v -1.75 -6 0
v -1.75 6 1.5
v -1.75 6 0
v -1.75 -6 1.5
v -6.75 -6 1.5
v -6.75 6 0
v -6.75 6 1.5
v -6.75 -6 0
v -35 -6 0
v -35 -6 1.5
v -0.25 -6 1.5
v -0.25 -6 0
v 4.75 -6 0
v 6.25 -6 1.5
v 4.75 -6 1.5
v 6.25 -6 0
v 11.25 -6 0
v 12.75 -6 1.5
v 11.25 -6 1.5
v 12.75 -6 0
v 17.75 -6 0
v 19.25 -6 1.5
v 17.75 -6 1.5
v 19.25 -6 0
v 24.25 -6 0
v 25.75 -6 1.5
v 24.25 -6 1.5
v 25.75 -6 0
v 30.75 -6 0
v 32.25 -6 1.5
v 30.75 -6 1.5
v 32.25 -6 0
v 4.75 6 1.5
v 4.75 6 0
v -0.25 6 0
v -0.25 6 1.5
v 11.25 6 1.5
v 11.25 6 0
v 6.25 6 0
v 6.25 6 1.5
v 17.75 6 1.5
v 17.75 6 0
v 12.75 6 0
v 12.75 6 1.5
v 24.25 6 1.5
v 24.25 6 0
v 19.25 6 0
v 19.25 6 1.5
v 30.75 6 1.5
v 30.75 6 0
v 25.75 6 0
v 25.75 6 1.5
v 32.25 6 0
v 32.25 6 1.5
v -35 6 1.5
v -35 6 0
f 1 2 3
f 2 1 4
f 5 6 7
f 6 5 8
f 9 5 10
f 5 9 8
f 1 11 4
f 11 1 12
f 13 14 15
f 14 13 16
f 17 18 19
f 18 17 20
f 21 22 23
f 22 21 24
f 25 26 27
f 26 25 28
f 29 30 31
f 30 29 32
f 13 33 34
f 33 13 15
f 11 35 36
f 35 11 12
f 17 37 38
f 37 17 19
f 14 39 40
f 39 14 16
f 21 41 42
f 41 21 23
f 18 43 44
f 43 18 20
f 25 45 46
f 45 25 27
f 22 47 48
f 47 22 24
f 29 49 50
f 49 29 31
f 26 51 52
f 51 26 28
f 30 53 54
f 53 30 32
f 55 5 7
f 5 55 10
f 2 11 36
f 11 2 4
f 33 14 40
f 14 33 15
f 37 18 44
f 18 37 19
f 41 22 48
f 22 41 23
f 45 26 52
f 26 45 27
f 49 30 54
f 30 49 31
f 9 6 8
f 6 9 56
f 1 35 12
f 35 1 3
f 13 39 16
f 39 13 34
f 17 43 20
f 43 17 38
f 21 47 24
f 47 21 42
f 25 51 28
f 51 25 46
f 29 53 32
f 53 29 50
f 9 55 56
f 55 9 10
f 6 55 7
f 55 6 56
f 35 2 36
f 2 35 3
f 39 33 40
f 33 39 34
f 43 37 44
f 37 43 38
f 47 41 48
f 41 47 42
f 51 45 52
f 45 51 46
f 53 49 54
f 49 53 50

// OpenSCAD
// 10-well comb for casting agarose gels, printed lying flat
// Units: mm. Print orientation: flat on bed, teeth pointing -Y.

// ---------- Parameters ----------
spine_len      = 70;    // spine (back bar) length along X
spine_wid      = 12;    // spine width along Y
plate_thk      = 1.5;   // comb plate thickness along Z

tooth_count    = 10;    // number of teeth
tooth_w        = 5.0;   // tooth width along X
tooth_len      = 12;    // tooth length along Y
tooth_gap      = 1.5;   // gap between neighbouring teeth along X

eps            = 0.5;   // cutter overshoot past top/bottom faces
$fn            = 64;    // curve resolution (no curves here, set per rules)

// ---------- Derived ----------
row_start_x = -(tooth_count - 1) * tooth_gap / 2;  // first tooth left edge
row_end_x   = row_start_x + tooth_count * tooth_w + (tooth_count - 1) * tooth_gap;  // last tooth right edge

// ---------- Model ----------
difference() {
    // Base plate
    translate([-spine_len / 2, -spine_wid / 2, 0])
        cube([spine_len, spine_wid, plate_thk]);

    // Teeth, cut from -Y side, centred on spine in X
    for (i = [0 : tooth_count - 1]) {
        translate([row_start_x + i * (tooth_w + tooth_gap),
                   -tooth_len / 2,
                   -eps])
            cube([tooth_w, tooth_len + spine_wid / 2 + 1, plate_thk + 2 * eps]);
    }
}
